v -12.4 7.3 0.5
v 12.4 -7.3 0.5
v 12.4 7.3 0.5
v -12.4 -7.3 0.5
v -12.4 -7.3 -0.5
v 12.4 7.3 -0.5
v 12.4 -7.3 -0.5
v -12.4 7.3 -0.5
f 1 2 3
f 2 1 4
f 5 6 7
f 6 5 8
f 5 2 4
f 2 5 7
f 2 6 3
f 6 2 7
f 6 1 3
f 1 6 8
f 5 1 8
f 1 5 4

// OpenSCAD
$fn=64;

module pcb(size_x=24.8, size_y=14.6, thickness=1.0) {
    cube([size_x, size_y, thickness], center=true);
}

pcb();
